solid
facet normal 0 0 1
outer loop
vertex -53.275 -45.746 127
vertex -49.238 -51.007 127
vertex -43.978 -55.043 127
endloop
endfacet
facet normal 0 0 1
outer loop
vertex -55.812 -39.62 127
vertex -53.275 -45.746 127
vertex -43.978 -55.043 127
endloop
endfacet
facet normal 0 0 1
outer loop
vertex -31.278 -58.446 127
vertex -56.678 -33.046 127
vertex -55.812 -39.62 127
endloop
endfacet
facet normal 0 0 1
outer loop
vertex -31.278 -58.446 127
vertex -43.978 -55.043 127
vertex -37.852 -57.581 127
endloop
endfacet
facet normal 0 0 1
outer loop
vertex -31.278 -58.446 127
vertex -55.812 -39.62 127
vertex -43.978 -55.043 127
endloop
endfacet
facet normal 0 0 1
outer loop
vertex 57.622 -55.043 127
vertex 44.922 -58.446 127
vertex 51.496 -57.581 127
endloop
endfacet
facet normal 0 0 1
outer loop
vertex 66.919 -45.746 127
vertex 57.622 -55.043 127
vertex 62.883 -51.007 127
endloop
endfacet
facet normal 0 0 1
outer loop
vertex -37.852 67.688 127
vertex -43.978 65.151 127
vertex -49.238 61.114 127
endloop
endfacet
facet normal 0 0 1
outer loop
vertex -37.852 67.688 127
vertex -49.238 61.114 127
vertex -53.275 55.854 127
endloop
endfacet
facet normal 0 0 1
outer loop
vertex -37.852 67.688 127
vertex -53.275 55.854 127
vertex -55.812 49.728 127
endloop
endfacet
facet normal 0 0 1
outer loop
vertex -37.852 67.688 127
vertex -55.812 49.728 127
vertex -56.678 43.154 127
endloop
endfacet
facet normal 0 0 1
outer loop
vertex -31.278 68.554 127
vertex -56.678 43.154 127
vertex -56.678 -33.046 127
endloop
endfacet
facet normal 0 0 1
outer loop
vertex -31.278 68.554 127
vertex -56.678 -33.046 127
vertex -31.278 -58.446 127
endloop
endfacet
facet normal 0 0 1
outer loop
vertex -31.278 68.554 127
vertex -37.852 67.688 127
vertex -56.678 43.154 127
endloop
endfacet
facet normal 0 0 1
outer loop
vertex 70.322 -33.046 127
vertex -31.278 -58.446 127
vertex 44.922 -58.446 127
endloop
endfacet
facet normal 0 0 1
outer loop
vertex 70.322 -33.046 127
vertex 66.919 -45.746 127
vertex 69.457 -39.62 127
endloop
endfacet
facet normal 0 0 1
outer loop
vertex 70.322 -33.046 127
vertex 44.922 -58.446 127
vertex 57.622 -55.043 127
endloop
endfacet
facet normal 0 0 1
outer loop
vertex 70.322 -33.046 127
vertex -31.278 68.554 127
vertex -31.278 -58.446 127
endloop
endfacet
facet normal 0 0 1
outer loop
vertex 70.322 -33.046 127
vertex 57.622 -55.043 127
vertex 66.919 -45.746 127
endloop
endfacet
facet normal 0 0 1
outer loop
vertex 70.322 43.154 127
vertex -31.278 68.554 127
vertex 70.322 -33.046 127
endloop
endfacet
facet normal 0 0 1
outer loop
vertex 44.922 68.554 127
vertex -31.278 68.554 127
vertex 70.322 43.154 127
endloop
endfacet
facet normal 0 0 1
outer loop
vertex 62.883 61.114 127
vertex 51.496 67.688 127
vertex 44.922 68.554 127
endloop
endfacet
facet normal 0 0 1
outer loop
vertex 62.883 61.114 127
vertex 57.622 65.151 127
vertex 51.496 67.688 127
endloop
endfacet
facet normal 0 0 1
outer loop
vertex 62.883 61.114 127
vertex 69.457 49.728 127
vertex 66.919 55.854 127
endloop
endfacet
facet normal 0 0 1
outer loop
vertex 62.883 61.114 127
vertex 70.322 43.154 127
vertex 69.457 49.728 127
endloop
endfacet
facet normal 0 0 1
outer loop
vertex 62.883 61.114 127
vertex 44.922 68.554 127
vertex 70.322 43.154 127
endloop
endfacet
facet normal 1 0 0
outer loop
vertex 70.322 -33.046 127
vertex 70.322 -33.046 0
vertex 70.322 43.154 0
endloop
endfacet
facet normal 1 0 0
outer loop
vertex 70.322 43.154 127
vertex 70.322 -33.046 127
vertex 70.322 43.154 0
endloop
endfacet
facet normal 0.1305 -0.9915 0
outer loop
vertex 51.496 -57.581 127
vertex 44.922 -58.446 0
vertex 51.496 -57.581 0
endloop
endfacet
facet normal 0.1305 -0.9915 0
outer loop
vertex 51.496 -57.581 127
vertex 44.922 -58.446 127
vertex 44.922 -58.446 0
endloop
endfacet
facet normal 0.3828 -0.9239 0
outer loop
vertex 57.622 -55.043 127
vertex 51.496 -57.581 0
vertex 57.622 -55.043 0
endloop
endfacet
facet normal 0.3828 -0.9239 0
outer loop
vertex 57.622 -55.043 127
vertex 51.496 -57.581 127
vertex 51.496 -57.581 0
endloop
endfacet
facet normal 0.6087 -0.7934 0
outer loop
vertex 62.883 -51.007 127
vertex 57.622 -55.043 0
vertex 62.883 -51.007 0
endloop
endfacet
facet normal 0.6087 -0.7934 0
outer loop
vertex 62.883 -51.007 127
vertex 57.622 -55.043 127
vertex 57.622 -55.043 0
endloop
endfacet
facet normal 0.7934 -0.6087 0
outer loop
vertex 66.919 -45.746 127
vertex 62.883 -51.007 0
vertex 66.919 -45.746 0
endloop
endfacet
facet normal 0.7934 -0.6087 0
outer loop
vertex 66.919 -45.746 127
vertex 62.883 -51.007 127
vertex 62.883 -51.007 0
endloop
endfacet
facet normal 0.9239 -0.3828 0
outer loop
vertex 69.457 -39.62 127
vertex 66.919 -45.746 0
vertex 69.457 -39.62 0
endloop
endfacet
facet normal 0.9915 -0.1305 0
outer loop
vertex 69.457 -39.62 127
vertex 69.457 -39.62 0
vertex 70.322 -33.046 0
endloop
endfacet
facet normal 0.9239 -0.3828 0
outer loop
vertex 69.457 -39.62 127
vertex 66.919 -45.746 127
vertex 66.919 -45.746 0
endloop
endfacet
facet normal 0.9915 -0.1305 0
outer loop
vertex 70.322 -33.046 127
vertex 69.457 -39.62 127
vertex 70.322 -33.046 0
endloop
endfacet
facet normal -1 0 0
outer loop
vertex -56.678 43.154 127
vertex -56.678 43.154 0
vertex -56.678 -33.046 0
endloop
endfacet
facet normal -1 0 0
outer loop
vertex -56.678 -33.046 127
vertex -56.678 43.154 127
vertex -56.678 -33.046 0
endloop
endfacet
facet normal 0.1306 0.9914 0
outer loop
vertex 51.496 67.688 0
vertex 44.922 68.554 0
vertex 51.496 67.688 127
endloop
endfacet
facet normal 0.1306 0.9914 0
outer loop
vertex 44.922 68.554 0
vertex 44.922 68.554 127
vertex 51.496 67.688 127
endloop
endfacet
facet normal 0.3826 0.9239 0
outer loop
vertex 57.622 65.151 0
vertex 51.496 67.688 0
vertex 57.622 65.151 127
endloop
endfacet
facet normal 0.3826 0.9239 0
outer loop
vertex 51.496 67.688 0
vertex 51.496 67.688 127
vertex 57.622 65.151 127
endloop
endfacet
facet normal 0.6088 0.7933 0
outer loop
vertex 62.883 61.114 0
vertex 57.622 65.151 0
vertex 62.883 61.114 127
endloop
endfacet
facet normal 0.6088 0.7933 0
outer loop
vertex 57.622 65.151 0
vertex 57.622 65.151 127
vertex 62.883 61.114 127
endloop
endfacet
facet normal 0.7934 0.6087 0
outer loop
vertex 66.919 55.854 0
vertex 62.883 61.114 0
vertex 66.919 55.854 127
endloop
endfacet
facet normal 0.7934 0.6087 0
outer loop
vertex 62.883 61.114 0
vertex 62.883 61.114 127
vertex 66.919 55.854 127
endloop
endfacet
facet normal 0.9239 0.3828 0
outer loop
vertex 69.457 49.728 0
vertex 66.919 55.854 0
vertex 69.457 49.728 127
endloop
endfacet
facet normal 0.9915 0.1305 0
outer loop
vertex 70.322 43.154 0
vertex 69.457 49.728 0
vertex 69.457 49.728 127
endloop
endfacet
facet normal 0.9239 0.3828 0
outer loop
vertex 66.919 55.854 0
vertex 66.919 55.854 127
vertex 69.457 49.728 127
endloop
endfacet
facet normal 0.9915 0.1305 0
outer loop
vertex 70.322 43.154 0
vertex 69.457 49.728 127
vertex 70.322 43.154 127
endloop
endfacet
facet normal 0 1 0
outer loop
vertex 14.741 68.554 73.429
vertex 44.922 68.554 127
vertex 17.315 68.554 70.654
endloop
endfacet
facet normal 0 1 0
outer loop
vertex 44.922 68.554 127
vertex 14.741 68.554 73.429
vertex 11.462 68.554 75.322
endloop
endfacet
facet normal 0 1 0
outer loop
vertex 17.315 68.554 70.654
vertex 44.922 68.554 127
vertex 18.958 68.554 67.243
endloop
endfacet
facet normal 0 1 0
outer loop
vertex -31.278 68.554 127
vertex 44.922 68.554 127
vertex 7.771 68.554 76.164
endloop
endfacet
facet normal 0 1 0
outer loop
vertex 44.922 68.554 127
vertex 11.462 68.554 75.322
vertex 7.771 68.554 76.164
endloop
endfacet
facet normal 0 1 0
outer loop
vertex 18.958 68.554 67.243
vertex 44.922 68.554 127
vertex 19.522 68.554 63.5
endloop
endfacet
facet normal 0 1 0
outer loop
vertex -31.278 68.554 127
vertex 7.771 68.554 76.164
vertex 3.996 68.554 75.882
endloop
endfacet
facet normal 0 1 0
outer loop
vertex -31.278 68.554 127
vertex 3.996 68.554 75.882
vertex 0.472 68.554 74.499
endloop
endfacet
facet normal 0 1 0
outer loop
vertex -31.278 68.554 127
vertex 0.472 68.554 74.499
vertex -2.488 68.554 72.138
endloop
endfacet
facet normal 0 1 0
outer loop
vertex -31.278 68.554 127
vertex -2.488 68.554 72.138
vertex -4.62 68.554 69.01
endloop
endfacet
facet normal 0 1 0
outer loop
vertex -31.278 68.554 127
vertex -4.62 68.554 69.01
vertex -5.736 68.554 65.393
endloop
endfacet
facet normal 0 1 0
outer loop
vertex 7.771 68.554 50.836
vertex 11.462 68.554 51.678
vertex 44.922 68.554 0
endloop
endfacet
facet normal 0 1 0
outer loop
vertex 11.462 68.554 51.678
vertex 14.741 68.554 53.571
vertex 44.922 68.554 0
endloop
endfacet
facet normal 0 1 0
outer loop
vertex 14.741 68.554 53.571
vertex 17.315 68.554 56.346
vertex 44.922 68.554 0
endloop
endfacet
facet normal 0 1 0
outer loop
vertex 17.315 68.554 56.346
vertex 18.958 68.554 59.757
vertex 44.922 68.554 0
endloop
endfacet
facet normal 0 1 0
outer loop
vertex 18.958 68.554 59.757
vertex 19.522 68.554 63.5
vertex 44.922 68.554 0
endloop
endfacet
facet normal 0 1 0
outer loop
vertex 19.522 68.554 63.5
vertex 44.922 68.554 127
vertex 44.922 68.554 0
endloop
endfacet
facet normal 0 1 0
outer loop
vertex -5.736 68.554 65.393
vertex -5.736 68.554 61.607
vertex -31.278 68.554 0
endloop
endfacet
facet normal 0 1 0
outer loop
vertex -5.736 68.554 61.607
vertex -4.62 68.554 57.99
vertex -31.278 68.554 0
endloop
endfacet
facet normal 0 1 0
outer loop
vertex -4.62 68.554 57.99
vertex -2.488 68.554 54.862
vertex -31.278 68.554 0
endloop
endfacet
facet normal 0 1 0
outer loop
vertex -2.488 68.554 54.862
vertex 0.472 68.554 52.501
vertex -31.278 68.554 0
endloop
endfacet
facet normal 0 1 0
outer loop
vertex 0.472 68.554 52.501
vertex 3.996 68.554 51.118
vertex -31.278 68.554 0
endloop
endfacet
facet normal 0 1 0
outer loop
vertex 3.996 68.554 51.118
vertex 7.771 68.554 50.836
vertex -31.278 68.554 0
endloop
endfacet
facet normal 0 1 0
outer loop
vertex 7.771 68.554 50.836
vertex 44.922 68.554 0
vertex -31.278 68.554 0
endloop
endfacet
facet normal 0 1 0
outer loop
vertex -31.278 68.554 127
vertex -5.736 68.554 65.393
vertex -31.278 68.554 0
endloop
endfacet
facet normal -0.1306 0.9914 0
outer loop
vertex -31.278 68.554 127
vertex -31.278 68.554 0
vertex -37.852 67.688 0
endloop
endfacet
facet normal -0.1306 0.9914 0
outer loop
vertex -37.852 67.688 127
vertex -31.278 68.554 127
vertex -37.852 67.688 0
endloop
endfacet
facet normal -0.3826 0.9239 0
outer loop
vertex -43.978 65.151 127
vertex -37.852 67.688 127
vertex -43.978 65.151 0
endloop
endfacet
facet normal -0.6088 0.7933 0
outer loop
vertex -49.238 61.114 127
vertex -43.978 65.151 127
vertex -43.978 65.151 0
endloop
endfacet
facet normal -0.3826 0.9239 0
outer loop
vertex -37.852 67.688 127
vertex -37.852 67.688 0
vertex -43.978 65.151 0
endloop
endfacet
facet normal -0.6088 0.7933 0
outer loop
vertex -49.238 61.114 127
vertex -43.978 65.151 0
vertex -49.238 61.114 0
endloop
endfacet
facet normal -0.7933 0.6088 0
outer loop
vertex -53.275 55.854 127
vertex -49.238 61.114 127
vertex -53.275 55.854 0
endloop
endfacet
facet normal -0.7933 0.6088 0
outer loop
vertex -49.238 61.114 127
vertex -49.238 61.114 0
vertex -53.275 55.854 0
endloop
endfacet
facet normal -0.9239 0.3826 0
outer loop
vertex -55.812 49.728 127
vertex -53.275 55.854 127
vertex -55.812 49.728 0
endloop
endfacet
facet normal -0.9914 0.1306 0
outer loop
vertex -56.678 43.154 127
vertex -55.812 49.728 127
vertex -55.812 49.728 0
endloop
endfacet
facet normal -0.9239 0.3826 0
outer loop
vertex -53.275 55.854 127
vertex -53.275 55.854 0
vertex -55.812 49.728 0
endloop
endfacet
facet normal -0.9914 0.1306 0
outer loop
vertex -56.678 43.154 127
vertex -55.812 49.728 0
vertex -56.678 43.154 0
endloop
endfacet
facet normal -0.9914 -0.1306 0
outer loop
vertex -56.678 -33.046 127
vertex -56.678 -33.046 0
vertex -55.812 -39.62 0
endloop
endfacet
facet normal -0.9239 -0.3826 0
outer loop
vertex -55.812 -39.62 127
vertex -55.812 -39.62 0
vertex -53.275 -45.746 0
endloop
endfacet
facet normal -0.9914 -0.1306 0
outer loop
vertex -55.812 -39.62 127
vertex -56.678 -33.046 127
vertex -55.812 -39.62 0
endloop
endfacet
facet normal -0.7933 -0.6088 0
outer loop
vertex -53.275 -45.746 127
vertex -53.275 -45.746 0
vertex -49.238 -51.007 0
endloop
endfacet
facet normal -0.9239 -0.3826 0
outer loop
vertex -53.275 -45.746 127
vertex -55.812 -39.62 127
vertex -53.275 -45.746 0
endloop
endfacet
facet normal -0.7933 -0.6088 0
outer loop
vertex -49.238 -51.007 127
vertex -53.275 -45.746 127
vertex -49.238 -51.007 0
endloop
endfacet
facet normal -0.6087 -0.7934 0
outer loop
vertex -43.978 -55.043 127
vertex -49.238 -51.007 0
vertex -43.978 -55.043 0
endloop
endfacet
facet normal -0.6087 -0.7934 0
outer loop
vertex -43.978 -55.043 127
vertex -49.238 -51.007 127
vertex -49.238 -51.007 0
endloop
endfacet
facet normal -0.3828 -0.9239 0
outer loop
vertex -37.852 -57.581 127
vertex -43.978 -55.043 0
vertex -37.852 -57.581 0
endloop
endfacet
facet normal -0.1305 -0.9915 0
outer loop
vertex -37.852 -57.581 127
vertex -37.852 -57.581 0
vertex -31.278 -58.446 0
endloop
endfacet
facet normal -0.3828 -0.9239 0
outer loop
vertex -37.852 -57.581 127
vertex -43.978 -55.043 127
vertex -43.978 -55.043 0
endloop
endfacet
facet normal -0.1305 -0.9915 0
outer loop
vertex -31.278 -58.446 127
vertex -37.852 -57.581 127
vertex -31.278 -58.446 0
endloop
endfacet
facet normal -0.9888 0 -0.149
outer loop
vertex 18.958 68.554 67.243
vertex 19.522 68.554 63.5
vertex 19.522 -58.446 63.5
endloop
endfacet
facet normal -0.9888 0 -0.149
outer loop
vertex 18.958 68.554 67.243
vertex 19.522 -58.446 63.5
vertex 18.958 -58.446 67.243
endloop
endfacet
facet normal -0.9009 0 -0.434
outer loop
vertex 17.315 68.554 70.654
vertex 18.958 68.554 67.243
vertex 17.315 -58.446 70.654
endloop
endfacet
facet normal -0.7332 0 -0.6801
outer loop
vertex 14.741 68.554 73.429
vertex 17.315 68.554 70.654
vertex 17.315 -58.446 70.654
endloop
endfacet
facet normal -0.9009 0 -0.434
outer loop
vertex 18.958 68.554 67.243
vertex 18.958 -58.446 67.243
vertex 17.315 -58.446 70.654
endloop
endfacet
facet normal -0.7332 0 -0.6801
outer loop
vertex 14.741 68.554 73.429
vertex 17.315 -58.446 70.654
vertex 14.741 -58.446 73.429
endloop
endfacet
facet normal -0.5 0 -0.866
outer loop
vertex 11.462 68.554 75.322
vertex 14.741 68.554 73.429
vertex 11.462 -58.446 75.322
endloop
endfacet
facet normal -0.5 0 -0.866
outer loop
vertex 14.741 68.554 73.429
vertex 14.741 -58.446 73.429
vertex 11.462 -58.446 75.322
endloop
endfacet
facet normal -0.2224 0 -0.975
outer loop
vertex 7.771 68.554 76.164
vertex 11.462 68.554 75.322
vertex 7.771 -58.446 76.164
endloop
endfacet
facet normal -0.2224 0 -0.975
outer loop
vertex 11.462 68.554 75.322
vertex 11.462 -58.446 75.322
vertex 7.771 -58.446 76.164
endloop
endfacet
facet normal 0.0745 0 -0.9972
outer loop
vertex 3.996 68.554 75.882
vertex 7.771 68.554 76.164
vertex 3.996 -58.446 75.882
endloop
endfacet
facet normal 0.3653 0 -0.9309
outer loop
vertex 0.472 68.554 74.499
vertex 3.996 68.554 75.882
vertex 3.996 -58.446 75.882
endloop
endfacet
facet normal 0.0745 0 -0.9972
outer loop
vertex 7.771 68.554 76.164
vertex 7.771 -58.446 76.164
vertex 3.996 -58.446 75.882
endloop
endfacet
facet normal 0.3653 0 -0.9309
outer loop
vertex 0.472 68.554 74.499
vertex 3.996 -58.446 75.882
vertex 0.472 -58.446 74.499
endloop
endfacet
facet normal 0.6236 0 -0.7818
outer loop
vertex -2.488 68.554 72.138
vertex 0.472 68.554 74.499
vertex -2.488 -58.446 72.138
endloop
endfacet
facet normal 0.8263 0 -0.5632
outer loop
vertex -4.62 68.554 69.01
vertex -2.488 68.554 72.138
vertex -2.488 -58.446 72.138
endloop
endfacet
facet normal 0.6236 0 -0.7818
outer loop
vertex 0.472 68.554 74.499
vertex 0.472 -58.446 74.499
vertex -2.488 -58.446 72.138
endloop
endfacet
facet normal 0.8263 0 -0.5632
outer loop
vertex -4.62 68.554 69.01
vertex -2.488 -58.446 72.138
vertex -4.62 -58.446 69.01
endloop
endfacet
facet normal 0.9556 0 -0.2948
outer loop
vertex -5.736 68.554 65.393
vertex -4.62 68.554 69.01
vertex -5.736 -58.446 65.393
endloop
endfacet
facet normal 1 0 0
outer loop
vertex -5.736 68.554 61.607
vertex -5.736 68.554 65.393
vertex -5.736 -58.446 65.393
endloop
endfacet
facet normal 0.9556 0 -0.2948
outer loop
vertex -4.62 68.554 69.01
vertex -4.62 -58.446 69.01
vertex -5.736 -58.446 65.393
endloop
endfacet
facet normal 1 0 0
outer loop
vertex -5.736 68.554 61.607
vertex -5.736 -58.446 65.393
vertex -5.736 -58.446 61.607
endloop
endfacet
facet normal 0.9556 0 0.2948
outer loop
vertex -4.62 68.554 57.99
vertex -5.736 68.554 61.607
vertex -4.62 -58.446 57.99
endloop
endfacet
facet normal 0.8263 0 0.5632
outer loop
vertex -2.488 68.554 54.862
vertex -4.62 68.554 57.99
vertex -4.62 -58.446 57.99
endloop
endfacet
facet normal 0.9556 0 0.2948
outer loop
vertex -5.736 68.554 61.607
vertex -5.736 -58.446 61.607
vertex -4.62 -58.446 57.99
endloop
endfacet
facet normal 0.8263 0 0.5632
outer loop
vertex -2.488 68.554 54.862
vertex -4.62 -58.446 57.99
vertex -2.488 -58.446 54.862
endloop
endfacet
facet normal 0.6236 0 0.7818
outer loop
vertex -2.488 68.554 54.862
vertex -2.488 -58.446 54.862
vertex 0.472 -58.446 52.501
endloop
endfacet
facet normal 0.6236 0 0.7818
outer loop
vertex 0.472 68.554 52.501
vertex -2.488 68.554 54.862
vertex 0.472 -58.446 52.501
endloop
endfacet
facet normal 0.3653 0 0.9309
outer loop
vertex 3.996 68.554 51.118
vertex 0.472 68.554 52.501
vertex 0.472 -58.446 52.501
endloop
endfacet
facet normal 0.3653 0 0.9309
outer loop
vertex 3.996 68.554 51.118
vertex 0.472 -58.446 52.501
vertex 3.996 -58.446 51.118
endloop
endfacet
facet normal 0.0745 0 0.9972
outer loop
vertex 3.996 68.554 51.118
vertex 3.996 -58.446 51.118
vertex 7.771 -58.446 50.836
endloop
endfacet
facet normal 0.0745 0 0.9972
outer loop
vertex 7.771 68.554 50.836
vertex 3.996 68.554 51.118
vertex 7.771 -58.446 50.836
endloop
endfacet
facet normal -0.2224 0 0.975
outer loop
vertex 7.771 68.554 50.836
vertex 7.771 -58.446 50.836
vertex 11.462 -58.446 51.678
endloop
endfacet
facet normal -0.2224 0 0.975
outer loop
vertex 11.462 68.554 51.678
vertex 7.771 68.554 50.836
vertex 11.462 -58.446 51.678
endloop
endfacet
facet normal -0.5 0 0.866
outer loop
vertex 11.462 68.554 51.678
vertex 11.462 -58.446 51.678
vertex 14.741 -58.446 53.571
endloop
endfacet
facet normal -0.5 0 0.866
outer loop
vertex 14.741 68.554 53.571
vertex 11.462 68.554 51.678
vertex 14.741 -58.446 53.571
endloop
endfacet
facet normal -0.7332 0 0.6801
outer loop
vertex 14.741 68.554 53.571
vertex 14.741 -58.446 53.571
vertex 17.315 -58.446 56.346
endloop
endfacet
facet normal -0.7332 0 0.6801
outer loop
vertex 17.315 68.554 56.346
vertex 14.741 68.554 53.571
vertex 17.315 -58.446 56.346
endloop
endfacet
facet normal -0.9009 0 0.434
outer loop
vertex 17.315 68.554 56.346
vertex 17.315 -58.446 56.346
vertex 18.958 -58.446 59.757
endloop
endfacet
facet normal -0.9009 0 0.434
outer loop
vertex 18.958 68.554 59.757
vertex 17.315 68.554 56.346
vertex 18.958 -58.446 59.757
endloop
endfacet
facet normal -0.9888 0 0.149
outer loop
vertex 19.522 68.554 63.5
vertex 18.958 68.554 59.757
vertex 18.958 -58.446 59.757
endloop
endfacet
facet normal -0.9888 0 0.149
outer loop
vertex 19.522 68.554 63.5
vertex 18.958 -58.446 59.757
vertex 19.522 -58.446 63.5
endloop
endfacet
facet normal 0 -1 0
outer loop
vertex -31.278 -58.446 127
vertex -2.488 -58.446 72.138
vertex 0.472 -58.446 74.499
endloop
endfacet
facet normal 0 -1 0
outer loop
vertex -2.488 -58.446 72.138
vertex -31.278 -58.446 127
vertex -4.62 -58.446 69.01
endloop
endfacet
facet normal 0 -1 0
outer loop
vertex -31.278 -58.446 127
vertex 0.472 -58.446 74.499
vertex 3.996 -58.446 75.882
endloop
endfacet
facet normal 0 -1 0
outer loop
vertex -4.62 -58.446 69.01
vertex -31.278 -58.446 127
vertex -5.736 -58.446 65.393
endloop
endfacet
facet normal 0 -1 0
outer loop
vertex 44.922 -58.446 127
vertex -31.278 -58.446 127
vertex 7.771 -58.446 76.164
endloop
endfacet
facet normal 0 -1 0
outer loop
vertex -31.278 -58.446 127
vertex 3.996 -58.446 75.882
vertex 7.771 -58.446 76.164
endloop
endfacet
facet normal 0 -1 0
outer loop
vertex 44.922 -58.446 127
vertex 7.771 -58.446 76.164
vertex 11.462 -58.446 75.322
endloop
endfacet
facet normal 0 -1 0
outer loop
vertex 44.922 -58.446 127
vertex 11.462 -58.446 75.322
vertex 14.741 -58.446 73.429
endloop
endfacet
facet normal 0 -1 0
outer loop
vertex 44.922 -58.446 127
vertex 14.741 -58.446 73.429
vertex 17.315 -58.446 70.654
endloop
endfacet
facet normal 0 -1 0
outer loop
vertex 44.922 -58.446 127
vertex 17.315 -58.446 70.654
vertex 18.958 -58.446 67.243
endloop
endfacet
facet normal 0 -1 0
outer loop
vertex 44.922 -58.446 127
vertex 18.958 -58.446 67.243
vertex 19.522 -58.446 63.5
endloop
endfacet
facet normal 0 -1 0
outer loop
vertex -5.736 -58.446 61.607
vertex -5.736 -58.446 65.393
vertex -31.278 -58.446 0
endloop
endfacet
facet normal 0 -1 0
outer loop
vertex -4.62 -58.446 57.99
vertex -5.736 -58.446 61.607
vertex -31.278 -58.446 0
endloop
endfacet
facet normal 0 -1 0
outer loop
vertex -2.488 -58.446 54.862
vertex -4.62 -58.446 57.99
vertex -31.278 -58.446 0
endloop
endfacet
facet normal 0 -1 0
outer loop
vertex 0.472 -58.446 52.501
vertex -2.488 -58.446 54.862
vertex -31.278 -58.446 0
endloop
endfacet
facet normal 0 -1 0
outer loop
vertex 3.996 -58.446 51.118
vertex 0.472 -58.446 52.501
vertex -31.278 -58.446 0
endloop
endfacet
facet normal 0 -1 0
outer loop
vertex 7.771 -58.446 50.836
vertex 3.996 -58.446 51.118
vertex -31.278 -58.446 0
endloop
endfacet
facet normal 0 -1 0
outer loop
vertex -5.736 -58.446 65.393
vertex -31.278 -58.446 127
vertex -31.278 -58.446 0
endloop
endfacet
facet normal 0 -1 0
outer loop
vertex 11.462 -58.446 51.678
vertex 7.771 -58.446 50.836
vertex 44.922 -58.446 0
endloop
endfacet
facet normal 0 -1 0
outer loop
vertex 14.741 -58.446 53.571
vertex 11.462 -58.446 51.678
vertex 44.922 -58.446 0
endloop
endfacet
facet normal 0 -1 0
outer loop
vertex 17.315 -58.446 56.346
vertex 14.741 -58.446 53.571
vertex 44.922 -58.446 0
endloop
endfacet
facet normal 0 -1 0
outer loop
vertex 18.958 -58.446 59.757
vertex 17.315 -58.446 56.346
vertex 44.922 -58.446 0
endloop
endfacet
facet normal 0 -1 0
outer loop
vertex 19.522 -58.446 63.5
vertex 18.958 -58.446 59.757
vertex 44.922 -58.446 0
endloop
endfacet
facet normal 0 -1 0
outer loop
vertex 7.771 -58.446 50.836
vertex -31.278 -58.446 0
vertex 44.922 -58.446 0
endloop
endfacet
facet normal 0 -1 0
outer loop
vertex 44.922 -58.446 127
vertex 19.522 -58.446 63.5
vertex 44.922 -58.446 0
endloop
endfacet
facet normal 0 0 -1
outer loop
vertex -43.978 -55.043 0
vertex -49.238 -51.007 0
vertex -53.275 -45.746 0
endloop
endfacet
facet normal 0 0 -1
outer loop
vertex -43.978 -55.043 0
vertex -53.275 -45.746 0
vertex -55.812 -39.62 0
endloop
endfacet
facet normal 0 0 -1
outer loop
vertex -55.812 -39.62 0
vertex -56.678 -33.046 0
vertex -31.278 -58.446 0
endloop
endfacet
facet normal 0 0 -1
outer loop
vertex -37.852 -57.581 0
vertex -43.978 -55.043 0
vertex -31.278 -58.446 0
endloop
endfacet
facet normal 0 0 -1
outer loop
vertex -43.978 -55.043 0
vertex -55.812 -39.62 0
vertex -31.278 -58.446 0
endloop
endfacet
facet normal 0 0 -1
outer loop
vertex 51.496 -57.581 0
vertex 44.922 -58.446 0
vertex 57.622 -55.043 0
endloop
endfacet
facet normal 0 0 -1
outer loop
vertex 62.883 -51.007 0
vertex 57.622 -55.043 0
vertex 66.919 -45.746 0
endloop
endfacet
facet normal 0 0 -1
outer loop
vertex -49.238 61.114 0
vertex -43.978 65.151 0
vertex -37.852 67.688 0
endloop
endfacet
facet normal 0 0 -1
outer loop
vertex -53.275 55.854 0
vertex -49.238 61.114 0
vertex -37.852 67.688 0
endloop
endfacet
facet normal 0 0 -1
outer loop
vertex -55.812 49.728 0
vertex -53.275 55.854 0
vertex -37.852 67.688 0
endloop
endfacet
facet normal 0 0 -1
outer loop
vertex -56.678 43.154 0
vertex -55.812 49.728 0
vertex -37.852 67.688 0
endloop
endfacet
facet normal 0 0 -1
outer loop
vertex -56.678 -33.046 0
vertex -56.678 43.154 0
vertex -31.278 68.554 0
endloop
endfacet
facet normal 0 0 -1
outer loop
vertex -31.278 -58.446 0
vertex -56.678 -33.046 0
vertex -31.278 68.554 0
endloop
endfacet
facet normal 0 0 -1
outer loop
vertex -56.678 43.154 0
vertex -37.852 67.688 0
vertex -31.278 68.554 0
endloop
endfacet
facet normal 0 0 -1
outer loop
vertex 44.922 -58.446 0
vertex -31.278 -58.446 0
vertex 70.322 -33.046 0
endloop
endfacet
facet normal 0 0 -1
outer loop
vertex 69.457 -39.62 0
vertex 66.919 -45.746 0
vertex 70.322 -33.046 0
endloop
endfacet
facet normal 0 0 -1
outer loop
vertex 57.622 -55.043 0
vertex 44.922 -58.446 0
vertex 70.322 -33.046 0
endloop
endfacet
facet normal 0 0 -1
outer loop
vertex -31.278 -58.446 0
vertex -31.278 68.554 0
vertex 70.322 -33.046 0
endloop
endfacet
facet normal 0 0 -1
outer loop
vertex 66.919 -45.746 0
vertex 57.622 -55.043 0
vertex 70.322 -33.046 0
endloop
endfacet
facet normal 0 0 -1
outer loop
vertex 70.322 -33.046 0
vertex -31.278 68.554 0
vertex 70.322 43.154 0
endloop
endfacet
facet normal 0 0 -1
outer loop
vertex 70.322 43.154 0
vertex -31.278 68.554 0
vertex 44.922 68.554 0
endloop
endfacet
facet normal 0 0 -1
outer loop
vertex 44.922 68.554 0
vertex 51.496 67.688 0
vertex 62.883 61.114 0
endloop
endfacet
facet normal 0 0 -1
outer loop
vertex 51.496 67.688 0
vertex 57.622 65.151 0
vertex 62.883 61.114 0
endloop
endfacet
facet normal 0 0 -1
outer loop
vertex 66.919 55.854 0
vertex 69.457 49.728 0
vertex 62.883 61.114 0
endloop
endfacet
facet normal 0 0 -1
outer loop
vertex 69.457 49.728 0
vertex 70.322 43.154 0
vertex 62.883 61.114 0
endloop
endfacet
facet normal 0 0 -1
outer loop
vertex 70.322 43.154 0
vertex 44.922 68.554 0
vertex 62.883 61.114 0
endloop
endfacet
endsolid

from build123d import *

# Parameters (mm, degrees)
F1_DEPTH = 127
F2_R     = 25.4
F3_R     = 12.7
F4_DEPTH = 127.001


with BuildPart() as f1:
    # F0 (on Top) → F1 (new body)
    with BuildSketch(Plane.XY):
        with BuildLine():
            Line((70.322224, 68.553888), (-31.277776, 68.553888))
            ThreePointArc((-31.277776, 68.553888), (-49.238288, 61.1144), (-56.677776, 43.153888))
            Line((-56.677776, 43.153888), (-56.677776, -58.446112))
            Line((-56.677776, -58.446112), (70.322224, -58.446112))
            Line((70.322224, -58.446112), (70.322224, 68.553888))
        make_face()
    extrude(amount=F1_DEPTH)

    # F2
    f2_edges = [f1.edges().sort_by_distance(p)[0] for p in [
        (70.322224, 68.553888, 63.5),
        (70.322224, -58.446112, 63.5),
        (-56.677776, -58.446112, 63.5),
    ]]
    fillet(f2_edges, radius=F2_R)

    # F3 (on face) → F4 (cut, through all)
    with BuildSketch(Plane.XZ.offset(58.446112)):
        with Locations((6.822224, 63.5)):
            Circle(F3_R)
    extrude(amount=-F4_DEPTH, mode=Mode.SUBTRACT)


solid = f1.part
